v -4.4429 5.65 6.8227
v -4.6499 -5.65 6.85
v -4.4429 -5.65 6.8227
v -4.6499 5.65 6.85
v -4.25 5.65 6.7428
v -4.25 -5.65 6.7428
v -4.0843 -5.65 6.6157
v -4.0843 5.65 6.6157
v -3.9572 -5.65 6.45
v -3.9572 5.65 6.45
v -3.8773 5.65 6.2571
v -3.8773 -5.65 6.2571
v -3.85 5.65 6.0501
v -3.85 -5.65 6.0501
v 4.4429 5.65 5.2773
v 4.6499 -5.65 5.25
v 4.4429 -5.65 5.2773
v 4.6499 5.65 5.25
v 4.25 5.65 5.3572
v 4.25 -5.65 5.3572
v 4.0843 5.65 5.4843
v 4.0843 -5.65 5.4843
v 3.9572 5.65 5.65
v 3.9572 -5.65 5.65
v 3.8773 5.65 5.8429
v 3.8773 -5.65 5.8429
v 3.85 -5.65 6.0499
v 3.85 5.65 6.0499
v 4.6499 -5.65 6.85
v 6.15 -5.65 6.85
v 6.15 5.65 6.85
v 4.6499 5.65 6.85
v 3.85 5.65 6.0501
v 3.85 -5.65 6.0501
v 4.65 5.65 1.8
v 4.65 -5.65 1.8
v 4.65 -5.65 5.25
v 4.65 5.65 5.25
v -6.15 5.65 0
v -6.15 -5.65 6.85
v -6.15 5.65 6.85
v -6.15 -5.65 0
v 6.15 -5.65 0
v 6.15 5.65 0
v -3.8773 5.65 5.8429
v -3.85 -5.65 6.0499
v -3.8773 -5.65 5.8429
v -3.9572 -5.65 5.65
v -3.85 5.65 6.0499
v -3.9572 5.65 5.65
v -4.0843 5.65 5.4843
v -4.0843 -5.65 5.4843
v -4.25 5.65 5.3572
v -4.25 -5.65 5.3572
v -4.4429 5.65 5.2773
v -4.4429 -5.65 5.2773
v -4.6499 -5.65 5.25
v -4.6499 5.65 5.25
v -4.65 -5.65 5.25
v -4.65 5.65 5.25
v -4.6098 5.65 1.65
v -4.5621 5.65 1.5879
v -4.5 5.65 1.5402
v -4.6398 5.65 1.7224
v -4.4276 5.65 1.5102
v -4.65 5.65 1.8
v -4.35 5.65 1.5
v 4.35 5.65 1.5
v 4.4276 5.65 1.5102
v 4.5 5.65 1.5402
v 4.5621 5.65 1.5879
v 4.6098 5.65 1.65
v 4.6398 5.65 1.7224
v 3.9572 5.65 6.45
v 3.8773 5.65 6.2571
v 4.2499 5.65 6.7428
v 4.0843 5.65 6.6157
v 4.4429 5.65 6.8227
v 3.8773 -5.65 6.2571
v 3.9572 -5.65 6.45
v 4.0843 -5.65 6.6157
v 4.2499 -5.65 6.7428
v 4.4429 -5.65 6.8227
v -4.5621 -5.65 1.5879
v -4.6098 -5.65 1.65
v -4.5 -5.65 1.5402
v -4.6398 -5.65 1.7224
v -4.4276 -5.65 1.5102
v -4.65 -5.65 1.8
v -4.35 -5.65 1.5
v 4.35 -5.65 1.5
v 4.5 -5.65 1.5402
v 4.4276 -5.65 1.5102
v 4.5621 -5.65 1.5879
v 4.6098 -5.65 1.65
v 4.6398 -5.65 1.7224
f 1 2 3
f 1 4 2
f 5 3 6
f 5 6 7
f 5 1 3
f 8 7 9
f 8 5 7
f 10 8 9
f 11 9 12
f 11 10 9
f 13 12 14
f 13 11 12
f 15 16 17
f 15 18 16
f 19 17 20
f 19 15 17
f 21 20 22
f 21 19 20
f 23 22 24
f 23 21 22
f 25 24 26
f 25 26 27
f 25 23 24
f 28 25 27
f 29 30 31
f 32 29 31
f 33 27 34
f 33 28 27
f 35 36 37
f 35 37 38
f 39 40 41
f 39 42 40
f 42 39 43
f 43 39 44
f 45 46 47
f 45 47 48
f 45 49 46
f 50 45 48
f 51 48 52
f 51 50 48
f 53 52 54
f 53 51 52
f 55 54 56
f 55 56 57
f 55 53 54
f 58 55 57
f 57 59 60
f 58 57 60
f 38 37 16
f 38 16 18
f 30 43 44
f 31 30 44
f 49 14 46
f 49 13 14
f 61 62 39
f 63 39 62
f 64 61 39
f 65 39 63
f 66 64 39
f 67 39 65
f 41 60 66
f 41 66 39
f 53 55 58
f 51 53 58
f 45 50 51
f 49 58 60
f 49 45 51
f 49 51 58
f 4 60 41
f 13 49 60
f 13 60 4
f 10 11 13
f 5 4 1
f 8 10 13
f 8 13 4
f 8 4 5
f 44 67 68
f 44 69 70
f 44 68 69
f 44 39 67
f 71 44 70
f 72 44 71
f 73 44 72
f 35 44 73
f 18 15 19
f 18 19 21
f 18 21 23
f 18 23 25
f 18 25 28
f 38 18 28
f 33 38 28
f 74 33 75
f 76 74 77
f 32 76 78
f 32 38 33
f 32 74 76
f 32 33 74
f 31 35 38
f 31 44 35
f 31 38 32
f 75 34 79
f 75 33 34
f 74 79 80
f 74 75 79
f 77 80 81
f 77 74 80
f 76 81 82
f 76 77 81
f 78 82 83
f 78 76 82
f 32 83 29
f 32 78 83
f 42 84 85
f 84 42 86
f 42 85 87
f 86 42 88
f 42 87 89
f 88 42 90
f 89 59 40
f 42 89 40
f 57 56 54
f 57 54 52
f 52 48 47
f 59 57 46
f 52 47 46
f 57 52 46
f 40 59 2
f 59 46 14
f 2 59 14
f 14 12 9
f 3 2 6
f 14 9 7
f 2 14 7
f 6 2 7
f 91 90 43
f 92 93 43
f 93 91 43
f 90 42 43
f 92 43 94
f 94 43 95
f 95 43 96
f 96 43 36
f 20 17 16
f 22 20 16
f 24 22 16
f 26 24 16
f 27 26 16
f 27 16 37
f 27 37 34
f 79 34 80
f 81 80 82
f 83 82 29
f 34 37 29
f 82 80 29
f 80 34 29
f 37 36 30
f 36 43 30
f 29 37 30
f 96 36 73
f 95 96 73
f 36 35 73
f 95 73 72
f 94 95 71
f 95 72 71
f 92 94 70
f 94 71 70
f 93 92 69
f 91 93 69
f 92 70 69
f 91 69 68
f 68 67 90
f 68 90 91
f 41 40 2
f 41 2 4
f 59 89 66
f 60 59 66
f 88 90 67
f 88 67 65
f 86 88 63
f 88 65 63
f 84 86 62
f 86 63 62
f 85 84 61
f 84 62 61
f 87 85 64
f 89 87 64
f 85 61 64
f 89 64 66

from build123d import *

# Parameters (mm, degrees)
SKETCH_1_W          = 12.3
SKETCH_1_H          = 11.3
EXTRUDE_1_DEPTH     = 2.5
SKETCH_2_W          = 1.5
SKETCH_2_H          = 11.3
EXTRUDE_2_DEPTH     = 4.35
SKETCH_5_W          = 9.3
SKETCH_5_H          = 11.5
CUT_EXTRUDE_1_DEPTH = 1
SKETCH_8_W          = 1.6
SKETCH_8_H          = 11.3
EXTRUDE_5_DEPTH     = 0.8
SKETCH_9_W          = 1.6
SKETCH_9_H          = 11.3
EXTRUDE_6_DEPTH     = 0.8
FILLET_7_R          = 0.8
FILLET_8_R          = 0.3


with BuildPart() as part:
    # 스케치1 → 보스-돌출1 (new body)
    with BuildSketch(Plane.XY):
        Rectangle(SKETCH_1_W, SKETCH_1_H)
    extrude(amount=EXTRUDE_1_DEPTH)

    # 스케치2 → 보스-돌출2 (add)
    with BuildSketch(Plane.XY.offset(2.5)):
        with Locations((-5.4, 0)):
            Rectangle(SKETCH_2_W, SKETCH_2_H)
        with Locations((5.4, 0)):
            Rectangle(SKETCH_2_W, SKETCH_2_H)
    extrude(amount=EXTRUDE_2_DEPTH)

    # 스케치5 → 컷-돌출1 (cut)
    with BuildSketch(Plane.XY.offset(2.5)):
        Rectangle(SKETCH_5_W, SKETCH_5_H)
    extrude(amount=-CUT_EXTRUDE_1_DEPTH, mode=Mode.SUBTRACT)

    # 스케치8 → 보스-돌출5 (add)
    with BuildSketch(Plane(origin=(-4.65, 0, 0), x_dir=(0, 0, -1), z_dir=(1, 0, 0))):
        with Locations((-6.05, 0)):
            Rectangle(SKETCH_8_W, SKETCH_8_H)
    extrude(amount=EXTRUDE_5_DEPTH)

    # 스케치9 → 보스-돌출6 (add)
    with BuildSketch(Plane.ZY.offset(-4.65)):
        with Locations((6.05, 0)):
            Rectangle(SKETCH_9_W, SKETCH_9_H)
    extrude(amount=EXTRUDE_6_DEPTH)

    # 필렛7
    fillet_7_edges = [part.edges().sort_by_distance(p)[0] for p in [
        (3.85, 0, 6.85),
        (-3.85, 0, 6.85),
        (3.85, 0, 5.25),
        (-3.85, 0, 5.25),
    ]]
    fillet(fillet_7_edges, radius=FILLET_7_R - 0.0001)  # a hair under: the kernel refuses the full size

    # 필렛8
    fillet_8_edges = [part.edges().sort_by_distance(p)[0] for p in [
        (4.65, 0, 1.5),
        (-4.65, 0, 1.5),
    ]]
    fillet(fillet_8_edges, radius=FILLET_8_R)


solid = part.part
